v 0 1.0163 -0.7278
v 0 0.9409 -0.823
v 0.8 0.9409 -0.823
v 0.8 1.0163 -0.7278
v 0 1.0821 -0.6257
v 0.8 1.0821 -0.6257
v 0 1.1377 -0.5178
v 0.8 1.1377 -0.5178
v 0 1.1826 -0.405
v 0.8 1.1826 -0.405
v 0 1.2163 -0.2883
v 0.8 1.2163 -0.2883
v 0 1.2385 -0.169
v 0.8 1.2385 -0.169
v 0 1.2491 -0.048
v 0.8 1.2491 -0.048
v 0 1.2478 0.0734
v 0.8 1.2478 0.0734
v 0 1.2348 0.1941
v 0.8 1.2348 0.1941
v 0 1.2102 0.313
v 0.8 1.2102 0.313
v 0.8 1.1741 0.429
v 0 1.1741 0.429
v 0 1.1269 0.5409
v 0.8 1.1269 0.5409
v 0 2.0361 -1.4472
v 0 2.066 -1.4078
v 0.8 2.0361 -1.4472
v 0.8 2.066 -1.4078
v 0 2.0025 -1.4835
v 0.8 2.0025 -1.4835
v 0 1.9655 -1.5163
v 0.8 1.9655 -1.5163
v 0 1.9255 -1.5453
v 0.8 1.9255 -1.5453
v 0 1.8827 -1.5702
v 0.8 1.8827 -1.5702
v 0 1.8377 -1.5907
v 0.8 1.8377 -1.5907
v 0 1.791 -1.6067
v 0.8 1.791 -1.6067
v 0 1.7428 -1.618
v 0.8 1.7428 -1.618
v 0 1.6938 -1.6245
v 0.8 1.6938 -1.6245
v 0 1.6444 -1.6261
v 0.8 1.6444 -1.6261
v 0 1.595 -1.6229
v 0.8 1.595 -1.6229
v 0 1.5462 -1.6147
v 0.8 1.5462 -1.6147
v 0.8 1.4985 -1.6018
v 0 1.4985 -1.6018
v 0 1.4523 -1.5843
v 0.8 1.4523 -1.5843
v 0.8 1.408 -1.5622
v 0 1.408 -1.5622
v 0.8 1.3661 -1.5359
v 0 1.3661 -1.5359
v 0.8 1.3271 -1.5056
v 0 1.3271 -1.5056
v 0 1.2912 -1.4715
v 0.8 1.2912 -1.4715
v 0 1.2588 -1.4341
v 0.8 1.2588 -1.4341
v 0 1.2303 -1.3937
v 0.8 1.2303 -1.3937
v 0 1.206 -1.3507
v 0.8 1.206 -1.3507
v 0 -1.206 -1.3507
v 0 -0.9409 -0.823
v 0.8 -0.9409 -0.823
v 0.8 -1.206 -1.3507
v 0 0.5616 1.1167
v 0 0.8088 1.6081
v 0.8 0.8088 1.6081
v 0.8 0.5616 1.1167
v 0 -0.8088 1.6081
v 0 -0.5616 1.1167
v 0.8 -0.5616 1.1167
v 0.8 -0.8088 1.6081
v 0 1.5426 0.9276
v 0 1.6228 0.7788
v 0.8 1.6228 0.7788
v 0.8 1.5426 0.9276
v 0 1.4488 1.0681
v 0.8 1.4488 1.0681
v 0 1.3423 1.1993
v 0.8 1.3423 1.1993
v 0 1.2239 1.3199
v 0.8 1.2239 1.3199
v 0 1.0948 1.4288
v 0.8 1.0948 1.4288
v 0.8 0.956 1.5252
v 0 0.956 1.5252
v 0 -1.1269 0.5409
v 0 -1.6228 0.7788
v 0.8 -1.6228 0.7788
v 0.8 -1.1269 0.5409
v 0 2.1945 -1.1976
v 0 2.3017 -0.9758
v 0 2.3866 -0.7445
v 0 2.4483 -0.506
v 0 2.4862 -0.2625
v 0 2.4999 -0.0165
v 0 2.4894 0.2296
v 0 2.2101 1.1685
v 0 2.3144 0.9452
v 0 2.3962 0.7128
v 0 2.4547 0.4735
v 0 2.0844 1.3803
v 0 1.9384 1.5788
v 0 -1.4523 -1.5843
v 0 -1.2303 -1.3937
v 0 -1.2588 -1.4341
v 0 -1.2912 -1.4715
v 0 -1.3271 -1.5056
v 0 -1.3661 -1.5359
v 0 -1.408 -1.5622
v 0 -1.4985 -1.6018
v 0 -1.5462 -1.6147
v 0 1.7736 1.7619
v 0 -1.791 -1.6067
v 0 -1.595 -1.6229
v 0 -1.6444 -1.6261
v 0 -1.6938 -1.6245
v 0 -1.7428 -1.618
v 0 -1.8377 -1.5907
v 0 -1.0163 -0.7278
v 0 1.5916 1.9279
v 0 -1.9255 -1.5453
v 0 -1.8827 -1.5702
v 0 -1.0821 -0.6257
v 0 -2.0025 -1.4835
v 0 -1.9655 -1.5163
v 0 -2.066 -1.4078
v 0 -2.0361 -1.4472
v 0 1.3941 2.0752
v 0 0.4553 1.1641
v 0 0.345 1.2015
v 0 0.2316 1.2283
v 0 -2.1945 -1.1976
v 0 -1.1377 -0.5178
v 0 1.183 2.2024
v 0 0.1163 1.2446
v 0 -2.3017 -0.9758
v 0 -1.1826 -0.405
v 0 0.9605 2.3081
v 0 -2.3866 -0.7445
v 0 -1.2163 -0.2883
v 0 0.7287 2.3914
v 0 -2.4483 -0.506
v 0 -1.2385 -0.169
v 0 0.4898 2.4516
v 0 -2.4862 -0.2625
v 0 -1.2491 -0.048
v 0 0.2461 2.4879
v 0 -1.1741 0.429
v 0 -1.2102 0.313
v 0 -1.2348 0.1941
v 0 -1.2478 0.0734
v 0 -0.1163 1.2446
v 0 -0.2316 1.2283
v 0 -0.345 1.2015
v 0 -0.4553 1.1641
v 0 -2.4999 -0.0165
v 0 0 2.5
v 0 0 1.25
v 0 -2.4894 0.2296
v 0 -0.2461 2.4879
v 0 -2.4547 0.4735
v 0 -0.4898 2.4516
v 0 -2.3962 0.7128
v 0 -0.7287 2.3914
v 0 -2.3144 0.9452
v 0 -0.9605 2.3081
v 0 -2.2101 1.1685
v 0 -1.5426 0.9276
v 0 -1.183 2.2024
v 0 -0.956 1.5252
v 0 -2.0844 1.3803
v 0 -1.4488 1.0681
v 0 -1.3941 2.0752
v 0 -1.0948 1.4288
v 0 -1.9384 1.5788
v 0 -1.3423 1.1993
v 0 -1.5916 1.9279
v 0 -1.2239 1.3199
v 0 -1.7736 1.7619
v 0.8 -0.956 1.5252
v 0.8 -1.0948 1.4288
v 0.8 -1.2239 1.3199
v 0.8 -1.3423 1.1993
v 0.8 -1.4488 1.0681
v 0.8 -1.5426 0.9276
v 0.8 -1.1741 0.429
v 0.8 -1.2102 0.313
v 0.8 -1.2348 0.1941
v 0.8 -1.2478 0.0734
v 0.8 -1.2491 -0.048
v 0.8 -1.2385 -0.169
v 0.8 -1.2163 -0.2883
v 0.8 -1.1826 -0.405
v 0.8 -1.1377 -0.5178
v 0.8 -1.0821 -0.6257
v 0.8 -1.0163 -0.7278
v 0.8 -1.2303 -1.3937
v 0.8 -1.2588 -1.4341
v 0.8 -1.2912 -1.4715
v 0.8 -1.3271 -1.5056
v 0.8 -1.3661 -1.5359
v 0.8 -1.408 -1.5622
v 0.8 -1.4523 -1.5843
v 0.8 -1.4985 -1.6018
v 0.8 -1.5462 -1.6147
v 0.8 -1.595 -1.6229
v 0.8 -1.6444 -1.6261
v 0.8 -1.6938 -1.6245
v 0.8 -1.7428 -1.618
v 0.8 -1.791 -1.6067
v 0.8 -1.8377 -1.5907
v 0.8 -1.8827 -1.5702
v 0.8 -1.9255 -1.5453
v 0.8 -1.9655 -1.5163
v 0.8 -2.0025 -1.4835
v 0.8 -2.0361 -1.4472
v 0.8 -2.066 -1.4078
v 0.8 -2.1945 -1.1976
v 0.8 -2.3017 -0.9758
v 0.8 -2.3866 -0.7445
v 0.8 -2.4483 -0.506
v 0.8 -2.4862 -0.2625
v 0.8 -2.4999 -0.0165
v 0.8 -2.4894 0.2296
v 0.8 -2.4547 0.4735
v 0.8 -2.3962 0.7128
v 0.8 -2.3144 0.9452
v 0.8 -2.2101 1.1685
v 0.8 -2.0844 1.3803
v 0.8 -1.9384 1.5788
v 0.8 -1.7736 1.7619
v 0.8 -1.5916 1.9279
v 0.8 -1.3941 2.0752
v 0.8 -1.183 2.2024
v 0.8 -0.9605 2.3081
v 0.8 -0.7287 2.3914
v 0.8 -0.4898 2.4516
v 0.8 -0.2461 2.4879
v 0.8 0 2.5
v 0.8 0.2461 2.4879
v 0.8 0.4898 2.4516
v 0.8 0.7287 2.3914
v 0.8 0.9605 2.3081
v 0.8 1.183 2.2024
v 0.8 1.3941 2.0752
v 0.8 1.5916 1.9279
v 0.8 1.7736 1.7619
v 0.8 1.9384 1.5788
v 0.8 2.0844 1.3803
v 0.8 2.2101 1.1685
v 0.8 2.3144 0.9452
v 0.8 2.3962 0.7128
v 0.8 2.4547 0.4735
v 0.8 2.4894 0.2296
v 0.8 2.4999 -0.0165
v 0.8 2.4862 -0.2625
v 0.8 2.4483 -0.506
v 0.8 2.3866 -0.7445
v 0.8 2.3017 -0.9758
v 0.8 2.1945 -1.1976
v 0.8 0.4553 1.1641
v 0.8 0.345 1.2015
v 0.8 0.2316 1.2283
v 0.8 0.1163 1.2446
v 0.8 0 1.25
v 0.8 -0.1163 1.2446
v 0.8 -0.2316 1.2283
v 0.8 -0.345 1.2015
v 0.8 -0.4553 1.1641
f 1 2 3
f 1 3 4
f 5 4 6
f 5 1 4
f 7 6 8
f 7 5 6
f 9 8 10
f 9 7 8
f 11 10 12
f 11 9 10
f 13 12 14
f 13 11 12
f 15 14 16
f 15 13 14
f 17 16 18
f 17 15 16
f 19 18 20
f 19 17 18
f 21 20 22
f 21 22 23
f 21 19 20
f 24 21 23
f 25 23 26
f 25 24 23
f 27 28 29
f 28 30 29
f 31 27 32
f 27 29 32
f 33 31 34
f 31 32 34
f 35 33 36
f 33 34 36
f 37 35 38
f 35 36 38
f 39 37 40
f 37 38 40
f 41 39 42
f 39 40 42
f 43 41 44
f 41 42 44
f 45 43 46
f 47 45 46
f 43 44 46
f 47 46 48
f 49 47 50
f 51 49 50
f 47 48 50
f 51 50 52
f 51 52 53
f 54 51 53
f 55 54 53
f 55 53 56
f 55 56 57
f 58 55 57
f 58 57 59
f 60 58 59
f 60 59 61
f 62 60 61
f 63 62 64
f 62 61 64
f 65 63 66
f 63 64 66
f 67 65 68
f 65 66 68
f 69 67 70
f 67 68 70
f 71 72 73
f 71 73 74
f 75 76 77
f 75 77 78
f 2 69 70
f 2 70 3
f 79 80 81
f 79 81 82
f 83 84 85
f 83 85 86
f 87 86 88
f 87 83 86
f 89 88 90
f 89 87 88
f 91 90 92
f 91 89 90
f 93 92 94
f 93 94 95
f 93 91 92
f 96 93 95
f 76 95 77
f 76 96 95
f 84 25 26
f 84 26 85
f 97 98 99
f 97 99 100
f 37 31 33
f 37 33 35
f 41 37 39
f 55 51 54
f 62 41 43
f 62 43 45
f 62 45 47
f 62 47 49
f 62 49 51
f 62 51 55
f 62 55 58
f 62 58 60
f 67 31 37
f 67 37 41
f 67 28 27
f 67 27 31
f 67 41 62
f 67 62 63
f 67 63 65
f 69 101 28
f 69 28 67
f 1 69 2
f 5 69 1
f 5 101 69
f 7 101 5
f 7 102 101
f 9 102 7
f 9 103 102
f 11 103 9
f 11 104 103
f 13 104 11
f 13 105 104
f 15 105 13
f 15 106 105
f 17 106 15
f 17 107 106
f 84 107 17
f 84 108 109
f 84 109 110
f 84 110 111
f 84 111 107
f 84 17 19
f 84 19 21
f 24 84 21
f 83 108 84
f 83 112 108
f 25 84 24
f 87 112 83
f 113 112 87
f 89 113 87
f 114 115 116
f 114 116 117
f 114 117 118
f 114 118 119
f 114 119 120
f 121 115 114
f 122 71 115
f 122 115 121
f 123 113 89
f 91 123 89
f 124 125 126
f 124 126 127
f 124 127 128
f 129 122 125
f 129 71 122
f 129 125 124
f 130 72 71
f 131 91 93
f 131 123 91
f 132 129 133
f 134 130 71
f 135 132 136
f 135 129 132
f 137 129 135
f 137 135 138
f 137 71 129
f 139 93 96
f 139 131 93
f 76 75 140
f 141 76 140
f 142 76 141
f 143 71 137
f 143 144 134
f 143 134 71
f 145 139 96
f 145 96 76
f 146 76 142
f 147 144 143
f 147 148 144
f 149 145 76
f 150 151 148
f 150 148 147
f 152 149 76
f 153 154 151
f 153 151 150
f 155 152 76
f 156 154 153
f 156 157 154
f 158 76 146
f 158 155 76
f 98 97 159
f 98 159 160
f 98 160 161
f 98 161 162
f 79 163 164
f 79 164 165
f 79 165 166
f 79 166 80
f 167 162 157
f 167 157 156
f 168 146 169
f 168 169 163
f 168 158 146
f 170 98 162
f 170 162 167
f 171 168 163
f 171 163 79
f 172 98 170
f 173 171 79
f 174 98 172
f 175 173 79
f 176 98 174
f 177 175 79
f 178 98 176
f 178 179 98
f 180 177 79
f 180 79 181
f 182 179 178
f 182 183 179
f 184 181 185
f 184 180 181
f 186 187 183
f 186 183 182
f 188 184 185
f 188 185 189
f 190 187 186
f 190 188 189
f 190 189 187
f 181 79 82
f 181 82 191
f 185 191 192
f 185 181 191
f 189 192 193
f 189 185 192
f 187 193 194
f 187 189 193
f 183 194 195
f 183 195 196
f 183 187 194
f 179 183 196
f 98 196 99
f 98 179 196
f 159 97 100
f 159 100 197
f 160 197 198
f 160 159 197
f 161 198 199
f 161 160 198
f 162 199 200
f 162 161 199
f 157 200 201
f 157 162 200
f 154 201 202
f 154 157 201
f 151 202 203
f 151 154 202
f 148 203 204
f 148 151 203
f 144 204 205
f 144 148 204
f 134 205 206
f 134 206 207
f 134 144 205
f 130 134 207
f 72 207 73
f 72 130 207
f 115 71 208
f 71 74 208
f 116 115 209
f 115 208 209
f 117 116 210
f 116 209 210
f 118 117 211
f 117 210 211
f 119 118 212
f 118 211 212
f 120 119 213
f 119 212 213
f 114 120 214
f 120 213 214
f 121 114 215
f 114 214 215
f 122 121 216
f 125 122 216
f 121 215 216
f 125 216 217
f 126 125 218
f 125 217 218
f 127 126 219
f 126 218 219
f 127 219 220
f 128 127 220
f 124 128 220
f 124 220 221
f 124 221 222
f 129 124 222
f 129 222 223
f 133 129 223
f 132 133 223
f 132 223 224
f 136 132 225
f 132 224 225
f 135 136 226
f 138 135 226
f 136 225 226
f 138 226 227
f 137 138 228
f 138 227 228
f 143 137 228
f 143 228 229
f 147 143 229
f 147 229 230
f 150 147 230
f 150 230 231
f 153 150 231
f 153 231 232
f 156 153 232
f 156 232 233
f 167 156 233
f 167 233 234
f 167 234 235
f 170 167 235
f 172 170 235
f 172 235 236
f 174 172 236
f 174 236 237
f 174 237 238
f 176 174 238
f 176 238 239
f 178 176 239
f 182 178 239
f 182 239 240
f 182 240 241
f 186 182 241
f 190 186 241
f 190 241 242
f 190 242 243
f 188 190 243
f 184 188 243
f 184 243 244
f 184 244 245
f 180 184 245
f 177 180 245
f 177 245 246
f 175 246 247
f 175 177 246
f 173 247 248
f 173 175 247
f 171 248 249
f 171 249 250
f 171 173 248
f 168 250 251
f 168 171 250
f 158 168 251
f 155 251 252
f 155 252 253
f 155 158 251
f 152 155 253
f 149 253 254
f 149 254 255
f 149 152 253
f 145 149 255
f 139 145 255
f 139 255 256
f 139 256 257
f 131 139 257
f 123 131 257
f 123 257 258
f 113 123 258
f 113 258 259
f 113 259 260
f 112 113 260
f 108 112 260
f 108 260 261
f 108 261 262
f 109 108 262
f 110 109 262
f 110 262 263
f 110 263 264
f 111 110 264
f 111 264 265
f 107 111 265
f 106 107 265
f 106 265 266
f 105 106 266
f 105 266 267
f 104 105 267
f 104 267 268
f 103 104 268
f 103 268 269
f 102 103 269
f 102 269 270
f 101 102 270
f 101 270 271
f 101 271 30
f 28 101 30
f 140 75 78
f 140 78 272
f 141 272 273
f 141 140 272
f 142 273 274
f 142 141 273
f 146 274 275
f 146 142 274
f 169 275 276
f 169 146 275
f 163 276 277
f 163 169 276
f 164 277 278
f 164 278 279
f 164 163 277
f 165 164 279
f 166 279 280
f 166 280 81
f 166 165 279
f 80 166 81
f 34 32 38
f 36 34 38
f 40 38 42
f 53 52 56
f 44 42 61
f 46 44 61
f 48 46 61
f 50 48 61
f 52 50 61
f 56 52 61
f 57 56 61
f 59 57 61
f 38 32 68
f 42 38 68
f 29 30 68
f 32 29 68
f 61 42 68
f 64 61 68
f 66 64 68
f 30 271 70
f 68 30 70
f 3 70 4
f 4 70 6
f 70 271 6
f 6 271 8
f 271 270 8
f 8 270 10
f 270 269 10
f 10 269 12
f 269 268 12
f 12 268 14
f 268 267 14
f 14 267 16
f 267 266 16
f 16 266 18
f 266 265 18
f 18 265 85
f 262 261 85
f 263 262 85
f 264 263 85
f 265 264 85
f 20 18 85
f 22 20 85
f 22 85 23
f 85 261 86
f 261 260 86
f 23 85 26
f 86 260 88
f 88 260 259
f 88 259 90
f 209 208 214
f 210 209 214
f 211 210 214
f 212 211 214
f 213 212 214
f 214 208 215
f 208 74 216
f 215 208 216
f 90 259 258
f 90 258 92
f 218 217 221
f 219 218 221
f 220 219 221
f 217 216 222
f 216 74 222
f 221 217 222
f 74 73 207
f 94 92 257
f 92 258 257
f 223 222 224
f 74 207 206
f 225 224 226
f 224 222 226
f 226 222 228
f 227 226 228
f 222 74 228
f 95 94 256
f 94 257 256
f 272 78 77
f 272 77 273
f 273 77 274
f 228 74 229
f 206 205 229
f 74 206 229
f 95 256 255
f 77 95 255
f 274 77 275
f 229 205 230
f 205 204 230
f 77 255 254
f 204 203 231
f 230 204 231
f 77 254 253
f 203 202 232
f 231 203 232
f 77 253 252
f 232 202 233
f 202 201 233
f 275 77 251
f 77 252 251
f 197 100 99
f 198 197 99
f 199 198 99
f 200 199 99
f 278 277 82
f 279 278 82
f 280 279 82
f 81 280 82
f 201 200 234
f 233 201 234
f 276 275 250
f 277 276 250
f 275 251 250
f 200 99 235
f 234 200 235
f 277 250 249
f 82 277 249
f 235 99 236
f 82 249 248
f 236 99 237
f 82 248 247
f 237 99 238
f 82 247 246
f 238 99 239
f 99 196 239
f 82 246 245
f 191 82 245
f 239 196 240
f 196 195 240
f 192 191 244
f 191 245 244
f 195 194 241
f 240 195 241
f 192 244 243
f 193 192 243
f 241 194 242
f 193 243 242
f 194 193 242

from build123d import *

# Parameters (mm, degrees)
EXTRUDE_1_DEPTH = 0.8
FILLET_1_R      = 0.5


with BuildPart() as part:
    # 草图1 → 凸台-拉伸1 (new body)
    with BuildSketch(Plane.YZ):
        with BuildLine():
            Line((-0.94087303, -0.822956828), (-1.523298061, -1.982312543))
            ThreePointArc((-1.523298061, -1.982312543), (0, 2.5), (1.523298061, -1.982312543))
            Line((1.523298061, -1.982312543), (0.94087303, -0.822956828))
            ThreePointArc((0.94087303, -0.822956828), (1.238528092, -0.16896202), (1.126927701, 0.540864084))
            Line((1.126927701, 0.540864084), (1.622775889, 0.778844281))
            ThreePointArc((1.622775889, 0.778844281), (1.284522021, 1.260953281), (0.808758974, 1.608076156))
            Line((0.808758974, 1.608076156), (0.561638176, 1.116719553))
            ThreePointArc((0.561638176, 1.116719553), (0, 1.25), (-0.561638176, 1.116719553))
            Line((-0.561638176, 1.116719553), (-0.808758974, 1.608076156))
            ThreePointArc((-0.808758974, 1.608076156), (-1.284522021, 1.260953281), (-1.622775889, 0.778844281))
            Line((-1.622775889, 0.778844281), (-1.126927701, 0.540864084))
            ThreePointArc((-1.126927701, 0.540864084), (-1.238528092, -0.16896202), (-0.94087303, -0.822956828))
        make_face()
    extrude(amount=EXTRUDE_1_DEPTH)

    # 圆角1
    fillet_1_edges = [part.edges().sort_by_distance(p)[0] for p in [
        (0.4, -1.523298061, -1.982312543),
        (0.4, 1.523298061, -1.982312543),
    ]]
    fillet(fillet_1_edges, radius=FILLET_1_R)


solid = part.part
